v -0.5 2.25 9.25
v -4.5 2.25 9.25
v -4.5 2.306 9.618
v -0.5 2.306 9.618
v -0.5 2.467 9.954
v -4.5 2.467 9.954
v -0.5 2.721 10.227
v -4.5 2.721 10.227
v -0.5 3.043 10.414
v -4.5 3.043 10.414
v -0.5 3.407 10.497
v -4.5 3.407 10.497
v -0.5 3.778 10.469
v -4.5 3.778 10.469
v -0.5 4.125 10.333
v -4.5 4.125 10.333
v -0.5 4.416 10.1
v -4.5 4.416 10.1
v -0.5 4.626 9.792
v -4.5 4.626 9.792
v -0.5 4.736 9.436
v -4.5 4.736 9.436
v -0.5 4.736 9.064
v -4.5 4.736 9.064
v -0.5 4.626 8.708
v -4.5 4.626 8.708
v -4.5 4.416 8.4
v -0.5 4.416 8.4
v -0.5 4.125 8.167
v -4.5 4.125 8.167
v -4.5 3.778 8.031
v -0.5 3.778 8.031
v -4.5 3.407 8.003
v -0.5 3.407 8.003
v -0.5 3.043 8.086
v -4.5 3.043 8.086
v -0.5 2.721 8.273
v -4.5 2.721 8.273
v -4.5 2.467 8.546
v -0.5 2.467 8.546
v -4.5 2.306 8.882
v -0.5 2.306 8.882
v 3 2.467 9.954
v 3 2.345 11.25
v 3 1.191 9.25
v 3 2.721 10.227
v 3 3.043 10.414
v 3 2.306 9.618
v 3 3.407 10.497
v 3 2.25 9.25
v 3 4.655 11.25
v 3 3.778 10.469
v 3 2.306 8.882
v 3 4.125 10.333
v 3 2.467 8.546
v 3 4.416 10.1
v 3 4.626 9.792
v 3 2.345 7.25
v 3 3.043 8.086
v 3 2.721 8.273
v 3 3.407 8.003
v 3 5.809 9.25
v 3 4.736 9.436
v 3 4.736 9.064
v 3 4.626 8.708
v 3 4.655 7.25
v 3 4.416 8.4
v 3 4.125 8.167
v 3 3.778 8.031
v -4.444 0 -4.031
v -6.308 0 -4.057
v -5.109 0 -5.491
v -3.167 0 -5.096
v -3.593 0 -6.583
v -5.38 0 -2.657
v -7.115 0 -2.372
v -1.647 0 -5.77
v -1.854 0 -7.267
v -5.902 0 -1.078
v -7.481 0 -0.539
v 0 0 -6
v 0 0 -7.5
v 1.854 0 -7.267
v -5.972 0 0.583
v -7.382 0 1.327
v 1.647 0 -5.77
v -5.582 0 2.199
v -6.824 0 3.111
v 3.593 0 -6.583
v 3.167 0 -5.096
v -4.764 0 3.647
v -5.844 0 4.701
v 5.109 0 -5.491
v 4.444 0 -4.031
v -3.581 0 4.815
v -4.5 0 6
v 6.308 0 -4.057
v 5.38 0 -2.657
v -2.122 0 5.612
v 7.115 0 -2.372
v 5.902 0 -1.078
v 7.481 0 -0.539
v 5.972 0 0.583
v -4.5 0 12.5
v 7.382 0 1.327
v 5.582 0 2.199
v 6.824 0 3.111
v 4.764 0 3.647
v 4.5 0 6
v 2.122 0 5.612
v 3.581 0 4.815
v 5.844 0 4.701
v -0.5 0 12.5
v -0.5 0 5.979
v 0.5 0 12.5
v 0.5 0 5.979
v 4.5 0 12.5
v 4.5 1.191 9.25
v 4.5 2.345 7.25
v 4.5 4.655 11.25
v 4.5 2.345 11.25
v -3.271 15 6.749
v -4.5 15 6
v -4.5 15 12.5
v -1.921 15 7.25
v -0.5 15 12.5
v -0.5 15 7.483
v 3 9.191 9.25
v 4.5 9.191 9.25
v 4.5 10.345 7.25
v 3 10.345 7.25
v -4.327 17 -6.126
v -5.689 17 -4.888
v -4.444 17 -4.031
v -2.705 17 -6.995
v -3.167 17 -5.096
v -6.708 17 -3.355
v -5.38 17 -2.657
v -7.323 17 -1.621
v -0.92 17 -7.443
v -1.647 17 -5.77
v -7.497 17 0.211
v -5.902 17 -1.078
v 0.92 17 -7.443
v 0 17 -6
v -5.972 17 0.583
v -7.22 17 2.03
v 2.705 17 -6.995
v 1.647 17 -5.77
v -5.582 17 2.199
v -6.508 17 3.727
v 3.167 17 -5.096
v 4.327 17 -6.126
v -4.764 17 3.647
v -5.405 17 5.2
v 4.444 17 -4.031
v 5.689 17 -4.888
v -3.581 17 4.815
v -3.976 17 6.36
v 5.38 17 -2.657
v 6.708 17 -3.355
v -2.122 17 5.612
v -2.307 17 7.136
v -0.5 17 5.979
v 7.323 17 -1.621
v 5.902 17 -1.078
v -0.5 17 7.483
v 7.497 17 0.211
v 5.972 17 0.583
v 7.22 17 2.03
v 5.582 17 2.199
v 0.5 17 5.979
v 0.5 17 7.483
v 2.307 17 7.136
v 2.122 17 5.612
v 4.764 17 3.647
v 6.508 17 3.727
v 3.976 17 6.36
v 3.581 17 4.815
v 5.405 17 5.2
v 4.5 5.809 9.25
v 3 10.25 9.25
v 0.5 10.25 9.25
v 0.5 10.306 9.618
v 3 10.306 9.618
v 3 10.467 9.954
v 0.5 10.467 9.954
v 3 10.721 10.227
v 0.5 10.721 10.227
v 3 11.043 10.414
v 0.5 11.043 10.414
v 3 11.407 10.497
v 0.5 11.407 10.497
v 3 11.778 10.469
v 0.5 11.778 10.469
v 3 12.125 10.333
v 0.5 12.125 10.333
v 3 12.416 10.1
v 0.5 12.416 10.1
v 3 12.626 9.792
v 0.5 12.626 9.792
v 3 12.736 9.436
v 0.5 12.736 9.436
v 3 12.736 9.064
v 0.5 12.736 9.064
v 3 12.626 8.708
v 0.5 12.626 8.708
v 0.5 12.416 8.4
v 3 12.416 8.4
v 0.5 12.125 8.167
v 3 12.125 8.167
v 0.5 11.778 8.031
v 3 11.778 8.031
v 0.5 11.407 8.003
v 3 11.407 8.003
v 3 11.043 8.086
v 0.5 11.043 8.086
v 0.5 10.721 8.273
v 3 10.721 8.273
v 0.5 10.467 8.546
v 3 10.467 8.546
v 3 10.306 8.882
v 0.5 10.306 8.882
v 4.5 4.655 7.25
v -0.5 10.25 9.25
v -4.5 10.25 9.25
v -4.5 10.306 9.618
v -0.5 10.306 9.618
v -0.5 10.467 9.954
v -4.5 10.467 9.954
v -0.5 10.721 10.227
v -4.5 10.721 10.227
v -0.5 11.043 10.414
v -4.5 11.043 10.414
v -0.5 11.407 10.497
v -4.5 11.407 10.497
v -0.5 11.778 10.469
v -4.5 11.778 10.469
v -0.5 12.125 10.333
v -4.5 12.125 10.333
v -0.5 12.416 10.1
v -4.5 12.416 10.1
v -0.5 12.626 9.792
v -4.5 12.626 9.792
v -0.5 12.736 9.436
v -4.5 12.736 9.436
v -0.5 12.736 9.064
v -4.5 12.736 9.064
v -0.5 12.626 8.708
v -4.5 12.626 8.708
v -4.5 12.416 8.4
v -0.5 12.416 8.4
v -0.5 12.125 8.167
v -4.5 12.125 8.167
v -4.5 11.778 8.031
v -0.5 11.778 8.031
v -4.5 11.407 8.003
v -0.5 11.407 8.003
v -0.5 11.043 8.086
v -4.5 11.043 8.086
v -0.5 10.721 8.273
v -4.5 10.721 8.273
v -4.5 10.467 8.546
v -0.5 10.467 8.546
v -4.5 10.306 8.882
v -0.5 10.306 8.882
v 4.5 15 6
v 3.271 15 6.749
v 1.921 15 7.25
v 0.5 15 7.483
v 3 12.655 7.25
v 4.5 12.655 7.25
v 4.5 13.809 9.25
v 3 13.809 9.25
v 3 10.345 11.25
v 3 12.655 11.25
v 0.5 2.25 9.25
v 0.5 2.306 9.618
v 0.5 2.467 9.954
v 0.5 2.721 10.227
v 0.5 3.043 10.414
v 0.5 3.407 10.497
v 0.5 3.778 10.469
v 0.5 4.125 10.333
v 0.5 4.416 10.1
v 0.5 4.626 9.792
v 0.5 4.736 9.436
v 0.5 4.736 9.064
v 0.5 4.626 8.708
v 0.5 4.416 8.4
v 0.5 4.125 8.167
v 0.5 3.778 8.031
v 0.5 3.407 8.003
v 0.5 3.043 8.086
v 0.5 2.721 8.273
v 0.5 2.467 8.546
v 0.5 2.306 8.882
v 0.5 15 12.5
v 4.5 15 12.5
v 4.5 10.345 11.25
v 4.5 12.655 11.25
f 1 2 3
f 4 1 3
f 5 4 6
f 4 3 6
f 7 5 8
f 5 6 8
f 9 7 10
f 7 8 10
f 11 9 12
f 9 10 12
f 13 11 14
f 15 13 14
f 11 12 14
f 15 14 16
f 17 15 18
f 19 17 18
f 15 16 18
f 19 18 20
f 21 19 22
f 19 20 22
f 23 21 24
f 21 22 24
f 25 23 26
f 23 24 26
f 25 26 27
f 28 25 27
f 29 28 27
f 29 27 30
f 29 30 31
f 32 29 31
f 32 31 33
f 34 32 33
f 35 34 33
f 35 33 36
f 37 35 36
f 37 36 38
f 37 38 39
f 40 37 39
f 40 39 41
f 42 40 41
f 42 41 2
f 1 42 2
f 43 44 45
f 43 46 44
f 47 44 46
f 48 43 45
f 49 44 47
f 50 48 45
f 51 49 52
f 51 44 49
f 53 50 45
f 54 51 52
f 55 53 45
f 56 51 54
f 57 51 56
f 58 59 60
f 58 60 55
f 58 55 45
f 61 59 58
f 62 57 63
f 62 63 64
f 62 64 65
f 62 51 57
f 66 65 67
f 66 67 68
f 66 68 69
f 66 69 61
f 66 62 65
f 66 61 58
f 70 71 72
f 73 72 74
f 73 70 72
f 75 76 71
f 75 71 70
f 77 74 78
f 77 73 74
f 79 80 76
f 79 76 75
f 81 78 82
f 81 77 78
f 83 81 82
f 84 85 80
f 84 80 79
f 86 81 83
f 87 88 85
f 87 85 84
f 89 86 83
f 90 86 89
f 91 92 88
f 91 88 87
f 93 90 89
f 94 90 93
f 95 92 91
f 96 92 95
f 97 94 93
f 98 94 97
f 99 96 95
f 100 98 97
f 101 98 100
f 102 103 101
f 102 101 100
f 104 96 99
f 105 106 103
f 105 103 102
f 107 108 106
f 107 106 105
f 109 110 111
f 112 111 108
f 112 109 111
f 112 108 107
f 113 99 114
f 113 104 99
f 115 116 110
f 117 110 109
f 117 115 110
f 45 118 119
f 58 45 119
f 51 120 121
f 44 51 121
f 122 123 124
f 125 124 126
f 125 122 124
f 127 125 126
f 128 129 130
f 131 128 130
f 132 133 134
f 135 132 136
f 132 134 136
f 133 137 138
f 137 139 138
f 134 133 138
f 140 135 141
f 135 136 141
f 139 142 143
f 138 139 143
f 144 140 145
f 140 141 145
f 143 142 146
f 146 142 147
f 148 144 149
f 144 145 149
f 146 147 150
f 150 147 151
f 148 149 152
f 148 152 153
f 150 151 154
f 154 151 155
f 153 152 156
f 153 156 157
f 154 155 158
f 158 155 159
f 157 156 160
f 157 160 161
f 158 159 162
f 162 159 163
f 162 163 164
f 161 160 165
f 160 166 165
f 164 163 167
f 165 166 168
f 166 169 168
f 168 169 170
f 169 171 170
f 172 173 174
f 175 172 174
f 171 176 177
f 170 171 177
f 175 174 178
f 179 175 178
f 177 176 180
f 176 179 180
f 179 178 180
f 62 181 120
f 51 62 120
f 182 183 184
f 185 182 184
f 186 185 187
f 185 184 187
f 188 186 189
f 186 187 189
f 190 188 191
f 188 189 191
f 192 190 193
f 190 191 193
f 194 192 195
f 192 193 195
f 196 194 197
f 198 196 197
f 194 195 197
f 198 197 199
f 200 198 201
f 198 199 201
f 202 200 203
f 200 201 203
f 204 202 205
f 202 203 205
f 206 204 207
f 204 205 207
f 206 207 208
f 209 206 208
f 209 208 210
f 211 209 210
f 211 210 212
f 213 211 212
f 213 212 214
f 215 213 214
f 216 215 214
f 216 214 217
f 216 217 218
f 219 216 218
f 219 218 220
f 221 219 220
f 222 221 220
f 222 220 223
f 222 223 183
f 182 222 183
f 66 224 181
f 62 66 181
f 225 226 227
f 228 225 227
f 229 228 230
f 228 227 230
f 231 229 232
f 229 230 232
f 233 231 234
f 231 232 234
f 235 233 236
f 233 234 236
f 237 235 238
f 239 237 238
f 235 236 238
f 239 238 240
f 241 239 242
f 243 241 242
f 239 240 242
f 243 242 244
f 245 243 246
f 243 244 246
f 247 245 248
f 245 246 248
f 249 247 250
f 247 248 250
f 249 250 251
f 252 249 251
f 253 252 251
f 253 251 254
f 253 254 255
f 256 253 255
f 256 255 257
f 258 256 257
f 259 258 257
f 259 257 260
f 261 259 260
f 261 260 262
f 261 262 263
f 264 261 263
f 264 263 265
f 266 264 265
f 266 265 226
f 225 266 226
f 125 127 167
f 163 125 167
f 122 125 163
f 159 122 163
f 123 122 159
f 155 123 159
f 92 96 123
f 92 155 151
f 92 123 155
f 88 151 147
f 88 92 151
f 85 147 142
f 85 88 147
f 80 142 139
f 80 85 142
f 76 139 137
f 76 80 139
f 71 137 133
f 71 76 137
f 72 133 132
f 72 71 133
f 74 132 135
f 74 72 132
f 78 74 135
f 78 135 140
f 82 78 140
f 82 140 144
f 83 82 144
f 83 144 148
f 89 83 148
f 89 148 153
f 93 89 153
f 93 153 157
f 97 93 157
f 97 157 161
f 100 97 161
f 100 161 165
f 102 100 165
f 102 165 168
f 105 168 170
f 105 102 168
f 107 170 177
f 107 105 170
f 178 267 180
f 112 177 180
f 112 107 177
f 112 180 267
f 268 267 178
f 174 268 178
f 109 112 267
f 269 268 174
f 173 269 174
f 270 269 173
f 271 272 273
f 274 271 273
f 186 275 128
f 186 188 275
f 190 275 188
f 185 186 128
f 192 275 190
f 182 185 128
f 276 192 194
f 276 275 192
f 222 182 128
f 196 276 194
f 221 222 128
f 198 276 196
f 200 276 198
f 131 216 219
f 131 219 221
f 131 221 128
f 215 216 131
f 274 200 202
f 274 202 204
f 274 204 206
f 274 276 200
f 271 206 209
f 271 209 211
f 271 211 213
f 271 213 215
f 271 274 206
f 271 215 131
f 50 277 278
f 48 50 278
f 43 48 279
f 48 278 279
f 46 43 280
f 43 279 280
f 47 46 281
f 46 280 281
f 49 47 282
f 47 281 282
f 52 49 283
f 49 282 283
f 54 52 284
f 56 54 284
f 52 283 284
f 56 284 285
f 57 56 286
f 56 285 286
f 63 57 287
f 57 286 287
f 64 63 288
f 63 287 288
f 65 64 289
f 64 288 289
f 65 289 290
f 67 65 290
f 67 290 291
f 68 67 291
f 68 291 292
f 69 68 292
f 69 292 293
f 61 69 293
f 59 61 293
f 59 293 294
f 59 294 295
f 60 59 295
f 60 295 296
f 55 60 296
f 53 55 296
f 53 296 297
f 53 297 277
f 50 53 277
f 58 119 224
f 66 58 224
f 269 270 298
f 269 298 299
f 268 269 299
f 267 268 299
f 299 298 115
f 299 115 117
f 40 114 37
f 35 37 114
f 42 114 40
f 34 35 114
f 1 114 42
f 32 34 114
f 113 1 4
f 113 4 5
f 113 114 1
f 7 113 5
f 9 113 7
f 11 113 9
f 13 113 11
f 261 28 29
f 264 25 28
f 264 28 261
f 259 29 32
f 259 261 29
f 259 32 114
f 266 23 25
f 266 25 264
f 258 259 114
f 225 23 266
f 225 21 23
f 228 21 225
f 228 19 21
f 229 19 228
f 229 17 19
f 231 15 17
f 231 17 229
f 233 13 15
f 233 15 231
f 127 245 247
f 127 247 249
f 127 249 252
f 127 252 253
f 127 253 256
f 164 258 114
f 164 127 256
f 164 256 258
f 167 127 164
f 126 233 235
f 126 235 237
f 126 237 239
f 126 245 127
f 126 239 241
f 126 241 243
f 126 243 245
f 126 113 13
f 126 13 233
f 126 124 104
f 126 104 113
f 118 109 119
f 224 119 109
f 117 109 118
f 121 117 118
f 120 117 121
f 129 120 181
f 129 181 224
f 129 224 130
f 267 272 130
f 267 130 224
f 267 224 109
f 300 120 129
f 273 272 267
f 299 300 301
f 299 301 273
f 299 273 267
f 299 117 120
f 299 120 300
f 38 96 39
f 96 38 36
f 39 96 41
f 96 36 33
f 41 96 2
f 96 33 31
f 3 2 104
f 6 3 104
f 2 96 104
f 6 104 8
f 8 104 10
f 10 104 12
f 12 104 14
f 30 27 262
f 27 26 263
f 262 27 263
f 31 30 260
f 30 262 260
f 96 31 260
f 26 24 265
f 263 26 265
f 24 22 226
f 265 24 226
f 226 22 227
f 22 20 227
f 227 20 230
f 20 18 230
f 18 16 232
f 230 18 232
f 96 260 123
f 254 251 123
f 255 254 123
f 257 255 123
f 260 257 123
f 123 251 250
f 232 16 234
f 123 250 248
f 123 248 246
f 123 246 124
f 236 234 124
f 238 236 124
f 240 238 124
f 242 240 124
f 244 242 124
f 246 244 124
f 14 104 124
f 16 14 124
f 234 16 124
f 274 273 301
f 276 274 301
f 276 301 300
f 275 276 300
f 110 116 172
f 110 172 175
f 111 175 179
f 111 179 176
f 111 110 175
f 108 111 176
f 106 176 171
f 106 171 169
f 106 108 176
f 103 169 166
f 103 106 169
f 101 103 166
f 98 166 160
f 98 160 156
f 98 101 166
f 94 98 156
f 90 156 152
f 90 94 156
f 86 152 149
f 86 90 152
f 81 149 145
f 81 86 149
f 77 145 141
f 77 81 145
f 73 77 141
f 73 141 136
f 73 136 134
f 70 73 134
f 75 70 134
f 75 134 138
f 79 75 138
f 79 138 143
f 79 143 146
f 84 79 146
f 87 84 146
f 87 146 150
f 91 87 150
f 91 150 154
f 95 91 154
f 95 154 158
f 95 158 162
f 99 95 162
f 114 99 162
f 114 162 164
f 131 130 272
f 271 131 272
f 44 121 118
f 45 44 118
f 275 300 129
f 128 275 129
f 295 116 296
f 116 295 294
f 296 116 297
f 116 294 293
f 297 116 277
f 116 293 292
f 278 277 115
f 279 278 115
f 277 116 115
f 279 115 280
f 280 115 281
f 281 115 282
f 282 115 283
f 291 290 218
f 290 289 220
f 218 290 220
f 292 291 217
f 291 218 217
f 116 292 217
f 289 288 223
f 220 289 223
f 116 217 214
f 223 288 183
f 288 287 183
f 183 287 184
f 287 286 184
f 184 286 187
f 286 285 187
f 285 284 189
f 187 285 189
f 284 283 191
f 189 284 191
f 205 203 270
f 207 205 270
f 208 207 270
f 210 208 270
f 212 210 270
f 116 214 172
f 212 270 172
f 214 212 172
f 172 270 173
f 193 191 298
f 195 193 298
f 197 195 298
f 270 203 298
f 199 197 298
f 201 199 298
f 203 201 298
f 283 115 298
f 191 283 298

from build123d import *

# Parameters (mm, degrees)
SKETCH_1_R                  = 7.5
SKETCH_1_R_2                = 6
EXTRUDE_1_DEPTH             = 17
CUT_EXTRUDE_1_REACH         = 25.88
CUT_EXTRUDE_1_END_RADIUS    = 6
SKETCH_2_W                  = 1
SKETCH_2_H                  = 17
SKETCH_3_W                  = 4
SKETCH_3_H                  = 17
EXTRUDE_2_DEPTH             = 5
EXTRUDE_2_DIRECTION_2_REACH = 25.88
CUT_EXTRUDE_START           = -2
CUT_EXTRUDE_4_DEPTH         = 2
CUT_EXTRUDE_2_REACH         = 26.274
SKETCH_4_R                  = 1.25
CUT_EXTRUDE_3_DEPTH         = 1.5


with BuildPart() as part:
    # 草图1 → 凸台-拉伸1 (new body)
    with BuildSketch(Plane(origin=(0, 0, 0), x_dir=(1, 0, 0), z_dir=(0, 1, 0))):
        with Locations(Location((0, 0, 0), (0, 0, 270))):
            Circle(SKETCH_1_R)
        with Locations(Location((0, 0, 0), (0, 0, 270))):
            Circle(SKETCH_1_R_2, mode=Mode.SUBTRACT)
    extrude(amount=EXTRUDE_1_DEPTH)

    # 切除-拉伸1: up to this cylinder (the profile starts outside it)
    cut_extrude_1_end = Plane(origin=(0, 8.5, 0), z_dir=(0, -1, 0)) * Cylinder(CUT_EXTRUDE_1_END_RADIUS, 64.76, mode=Mode.PRIVATE)
    # 草图2 → 切除-拉伸1 (cut, up to the surface)
    with BuildSketch(Plane.XY.offset(7.5), mode=Mode.PRIVATE) as cut_extrude_1_sk1:
        with Locations((0, 8.5)):
            Rectangle(SKETCH_2_W, SKETCH_2_H)
    cut_extrude_1_tool1 = extrude(cut_extrude_1_sk1.sketch, amount=-CUT_EXTRUDE_1_REACH, mode=Mode.PRIVATE) - cut_extrude_1_end
    add(cut_extrude_1_tool1.solids().sort_by_distance((0, 8.5, 7.5))[0], mode=Mode.SUBTRACT)

    # 草图3 → 凸台-拉伸2 (add)
    with BuildSketch(Plane.XY.offset(7.5)):
        with Locations((-2.5, 8.5)):
            Rectangle(SKETCH_3_W, SKETCH_3_H)
        with Locations((2.5, 8.5)):
            Rectangle(SKETCH_3_W, SKETCH_3_H)
    extrude(amount=EXTRUDE_2_DEPTH)

    # 草图3 → 凸台-拉伸2 direction 2 (add, up to next)
    with BuildSketch(Plane.XY.offset(7.5), mode=Mode.PRIVATE) as extrude_2_direction_2_sk1:
        with Locations((-2.5, 8.5)):
            Rectangle(SKETCH_3_W, SKETCH_3_H)
    extrude_2_direction_2_tool1 = extrude(extrude_2_direction_2_sk1.sketch, amount=-EXTRUDE_2_DIRECTION_2_REACH, mode=Mode.PRIVATE) - part.part
    # 草图3 → 凸台-拉伸2 direction 2 (add, up to next)
    with BuildSketch(Plane.XY.offset(7.5), mode=Mode.PRIVATE) as extrude_2_direction_2_sk2:
        with Locations((2.5, 8.5)):
            Rectangle(SKETCH_3_W, SKETCH_3_H)
    extrude_2_direction_2_tool2 = extrude(extrude_2_direction_2_sk2.sketch, amount=-EXTRUDE_2_DIRECTION_2_REACH, mode=Mode.PRIVATE) - part.part
    add(extrude_2_direction_2_tool1.solids().sort_by_distance((-2.5, 8.5, 7.5))[0])
    add(extrude_2_direction_2_tool2.solids().sort_by_distance((2.5, 8.5, 7.5))[0])

    # 草图7 → 切除-拉伸4 (cut)
    with BuildSketch(Plane(origin=(0, 17, 0), x_dir=(1, 0, 0), z_dir=(0, 1, 0)).offset(CUT_EXTRUDE_START)):
        with BuildLine():
            Line((-4.5, -6), (-4.5, -12.5))
            Line((-4.5, -12.5), (4.5, -12.5))
            Line((4.5, -12.5), (4.5, -6))
            ThreePointArc((4.5, -6), (0, -7.5), (-4.5, -6))
        make_face()
    extrude(amount=CUT_EXTRUDE_4_DEPTH, mode=Mode.SUBTRACT)

    # 切除-拉伸2: up to this face of the body (flat: up to its plane)
    cut_extrude_2_end = Plane(part.part.faces().sort_by_distance((4.5, 7.5, 9.25))[0])
    # 草图4 → 切除-拉伸2 (cut, up to the picked face)
    with BuildSketch(Plane.ZY.offset(4.5), mode=Mode.PRIVATE) as cut_extrude_2_sk1:
        with Locations(Location((9.25, 11.5, 0), (0, 0, 270))):
            Circle(SKETCH_4_R)
    cut_extrude_2_tool1 = split(extrude(cut_extrude_2_sk1.sketch, amount=-CUT_EXTRUDE_2_REACH, mode=Mode.PRIVATE), bisect_by=cut_extrude_2_end, keep=Keep.BOTH, mode=Mode.PRIVATE)
    # 草图4 → 切除-拉伸2 (cut, up to the picked face)
    with BuildSketch(Plane.ZY.offset(4.5), mode=Mode.PRIVATE) as cut_extrude_2_sk2:
        with Locations(Location((9.25, 3.5, 0), (0, 0, 270))):
            Circle(SKETCH_4_R)
    cut_extrude_2_tool2 = split(extrude(cut_extrude_2_sk2.sketch, amount=-CUT_EXTRUDE_2_REACH, mode=Mode.PRIVATE), bisect_by=cut_extrude_2_end, keep=Keep.BOTH, mode=Mode.PRIVATE)
    add(cut_extrude_2_tool1.solids().sort_by(Axis((-4.5, 11.5, 9.25), (1, 0, 0)))[0], mode=Mode.SUBTRACT)
    add(cut_extrude_2_tool2.solids().sort_by(Axis((-4.5, 3.5, 9.25), (1, 0, 0)))[0], mode=Mode.SUBTRACT)

    # 草图5 → 切除-拉伸3 (cut)
    with BuildSketch(Plane(origin=(4.5, 0, 0), x_dir=(0, 0, -1), z_dir=(1, 0, 0))):
        Polygon((-9.25, 9.190598923), (-7.25, 10.345299462), (-7.25, 12.654700538), (-9.25, 13.809401077), (-11.25, 12.654700538), (-11.25, 10.345299462), align=None)
        Polygon((-9.25, 1.190598923), (-7.25, 2.345299462), (-7.25, 4.654700538), (-9.25, 5.809401077), (-11.25, 4.654700538), (-11.25, 2.345299462), align=None)
    extrude(amount=-CUT_EXTRUDE_3_DEPTH, mode=Mode.SUBTRACT)


solid = part.part
